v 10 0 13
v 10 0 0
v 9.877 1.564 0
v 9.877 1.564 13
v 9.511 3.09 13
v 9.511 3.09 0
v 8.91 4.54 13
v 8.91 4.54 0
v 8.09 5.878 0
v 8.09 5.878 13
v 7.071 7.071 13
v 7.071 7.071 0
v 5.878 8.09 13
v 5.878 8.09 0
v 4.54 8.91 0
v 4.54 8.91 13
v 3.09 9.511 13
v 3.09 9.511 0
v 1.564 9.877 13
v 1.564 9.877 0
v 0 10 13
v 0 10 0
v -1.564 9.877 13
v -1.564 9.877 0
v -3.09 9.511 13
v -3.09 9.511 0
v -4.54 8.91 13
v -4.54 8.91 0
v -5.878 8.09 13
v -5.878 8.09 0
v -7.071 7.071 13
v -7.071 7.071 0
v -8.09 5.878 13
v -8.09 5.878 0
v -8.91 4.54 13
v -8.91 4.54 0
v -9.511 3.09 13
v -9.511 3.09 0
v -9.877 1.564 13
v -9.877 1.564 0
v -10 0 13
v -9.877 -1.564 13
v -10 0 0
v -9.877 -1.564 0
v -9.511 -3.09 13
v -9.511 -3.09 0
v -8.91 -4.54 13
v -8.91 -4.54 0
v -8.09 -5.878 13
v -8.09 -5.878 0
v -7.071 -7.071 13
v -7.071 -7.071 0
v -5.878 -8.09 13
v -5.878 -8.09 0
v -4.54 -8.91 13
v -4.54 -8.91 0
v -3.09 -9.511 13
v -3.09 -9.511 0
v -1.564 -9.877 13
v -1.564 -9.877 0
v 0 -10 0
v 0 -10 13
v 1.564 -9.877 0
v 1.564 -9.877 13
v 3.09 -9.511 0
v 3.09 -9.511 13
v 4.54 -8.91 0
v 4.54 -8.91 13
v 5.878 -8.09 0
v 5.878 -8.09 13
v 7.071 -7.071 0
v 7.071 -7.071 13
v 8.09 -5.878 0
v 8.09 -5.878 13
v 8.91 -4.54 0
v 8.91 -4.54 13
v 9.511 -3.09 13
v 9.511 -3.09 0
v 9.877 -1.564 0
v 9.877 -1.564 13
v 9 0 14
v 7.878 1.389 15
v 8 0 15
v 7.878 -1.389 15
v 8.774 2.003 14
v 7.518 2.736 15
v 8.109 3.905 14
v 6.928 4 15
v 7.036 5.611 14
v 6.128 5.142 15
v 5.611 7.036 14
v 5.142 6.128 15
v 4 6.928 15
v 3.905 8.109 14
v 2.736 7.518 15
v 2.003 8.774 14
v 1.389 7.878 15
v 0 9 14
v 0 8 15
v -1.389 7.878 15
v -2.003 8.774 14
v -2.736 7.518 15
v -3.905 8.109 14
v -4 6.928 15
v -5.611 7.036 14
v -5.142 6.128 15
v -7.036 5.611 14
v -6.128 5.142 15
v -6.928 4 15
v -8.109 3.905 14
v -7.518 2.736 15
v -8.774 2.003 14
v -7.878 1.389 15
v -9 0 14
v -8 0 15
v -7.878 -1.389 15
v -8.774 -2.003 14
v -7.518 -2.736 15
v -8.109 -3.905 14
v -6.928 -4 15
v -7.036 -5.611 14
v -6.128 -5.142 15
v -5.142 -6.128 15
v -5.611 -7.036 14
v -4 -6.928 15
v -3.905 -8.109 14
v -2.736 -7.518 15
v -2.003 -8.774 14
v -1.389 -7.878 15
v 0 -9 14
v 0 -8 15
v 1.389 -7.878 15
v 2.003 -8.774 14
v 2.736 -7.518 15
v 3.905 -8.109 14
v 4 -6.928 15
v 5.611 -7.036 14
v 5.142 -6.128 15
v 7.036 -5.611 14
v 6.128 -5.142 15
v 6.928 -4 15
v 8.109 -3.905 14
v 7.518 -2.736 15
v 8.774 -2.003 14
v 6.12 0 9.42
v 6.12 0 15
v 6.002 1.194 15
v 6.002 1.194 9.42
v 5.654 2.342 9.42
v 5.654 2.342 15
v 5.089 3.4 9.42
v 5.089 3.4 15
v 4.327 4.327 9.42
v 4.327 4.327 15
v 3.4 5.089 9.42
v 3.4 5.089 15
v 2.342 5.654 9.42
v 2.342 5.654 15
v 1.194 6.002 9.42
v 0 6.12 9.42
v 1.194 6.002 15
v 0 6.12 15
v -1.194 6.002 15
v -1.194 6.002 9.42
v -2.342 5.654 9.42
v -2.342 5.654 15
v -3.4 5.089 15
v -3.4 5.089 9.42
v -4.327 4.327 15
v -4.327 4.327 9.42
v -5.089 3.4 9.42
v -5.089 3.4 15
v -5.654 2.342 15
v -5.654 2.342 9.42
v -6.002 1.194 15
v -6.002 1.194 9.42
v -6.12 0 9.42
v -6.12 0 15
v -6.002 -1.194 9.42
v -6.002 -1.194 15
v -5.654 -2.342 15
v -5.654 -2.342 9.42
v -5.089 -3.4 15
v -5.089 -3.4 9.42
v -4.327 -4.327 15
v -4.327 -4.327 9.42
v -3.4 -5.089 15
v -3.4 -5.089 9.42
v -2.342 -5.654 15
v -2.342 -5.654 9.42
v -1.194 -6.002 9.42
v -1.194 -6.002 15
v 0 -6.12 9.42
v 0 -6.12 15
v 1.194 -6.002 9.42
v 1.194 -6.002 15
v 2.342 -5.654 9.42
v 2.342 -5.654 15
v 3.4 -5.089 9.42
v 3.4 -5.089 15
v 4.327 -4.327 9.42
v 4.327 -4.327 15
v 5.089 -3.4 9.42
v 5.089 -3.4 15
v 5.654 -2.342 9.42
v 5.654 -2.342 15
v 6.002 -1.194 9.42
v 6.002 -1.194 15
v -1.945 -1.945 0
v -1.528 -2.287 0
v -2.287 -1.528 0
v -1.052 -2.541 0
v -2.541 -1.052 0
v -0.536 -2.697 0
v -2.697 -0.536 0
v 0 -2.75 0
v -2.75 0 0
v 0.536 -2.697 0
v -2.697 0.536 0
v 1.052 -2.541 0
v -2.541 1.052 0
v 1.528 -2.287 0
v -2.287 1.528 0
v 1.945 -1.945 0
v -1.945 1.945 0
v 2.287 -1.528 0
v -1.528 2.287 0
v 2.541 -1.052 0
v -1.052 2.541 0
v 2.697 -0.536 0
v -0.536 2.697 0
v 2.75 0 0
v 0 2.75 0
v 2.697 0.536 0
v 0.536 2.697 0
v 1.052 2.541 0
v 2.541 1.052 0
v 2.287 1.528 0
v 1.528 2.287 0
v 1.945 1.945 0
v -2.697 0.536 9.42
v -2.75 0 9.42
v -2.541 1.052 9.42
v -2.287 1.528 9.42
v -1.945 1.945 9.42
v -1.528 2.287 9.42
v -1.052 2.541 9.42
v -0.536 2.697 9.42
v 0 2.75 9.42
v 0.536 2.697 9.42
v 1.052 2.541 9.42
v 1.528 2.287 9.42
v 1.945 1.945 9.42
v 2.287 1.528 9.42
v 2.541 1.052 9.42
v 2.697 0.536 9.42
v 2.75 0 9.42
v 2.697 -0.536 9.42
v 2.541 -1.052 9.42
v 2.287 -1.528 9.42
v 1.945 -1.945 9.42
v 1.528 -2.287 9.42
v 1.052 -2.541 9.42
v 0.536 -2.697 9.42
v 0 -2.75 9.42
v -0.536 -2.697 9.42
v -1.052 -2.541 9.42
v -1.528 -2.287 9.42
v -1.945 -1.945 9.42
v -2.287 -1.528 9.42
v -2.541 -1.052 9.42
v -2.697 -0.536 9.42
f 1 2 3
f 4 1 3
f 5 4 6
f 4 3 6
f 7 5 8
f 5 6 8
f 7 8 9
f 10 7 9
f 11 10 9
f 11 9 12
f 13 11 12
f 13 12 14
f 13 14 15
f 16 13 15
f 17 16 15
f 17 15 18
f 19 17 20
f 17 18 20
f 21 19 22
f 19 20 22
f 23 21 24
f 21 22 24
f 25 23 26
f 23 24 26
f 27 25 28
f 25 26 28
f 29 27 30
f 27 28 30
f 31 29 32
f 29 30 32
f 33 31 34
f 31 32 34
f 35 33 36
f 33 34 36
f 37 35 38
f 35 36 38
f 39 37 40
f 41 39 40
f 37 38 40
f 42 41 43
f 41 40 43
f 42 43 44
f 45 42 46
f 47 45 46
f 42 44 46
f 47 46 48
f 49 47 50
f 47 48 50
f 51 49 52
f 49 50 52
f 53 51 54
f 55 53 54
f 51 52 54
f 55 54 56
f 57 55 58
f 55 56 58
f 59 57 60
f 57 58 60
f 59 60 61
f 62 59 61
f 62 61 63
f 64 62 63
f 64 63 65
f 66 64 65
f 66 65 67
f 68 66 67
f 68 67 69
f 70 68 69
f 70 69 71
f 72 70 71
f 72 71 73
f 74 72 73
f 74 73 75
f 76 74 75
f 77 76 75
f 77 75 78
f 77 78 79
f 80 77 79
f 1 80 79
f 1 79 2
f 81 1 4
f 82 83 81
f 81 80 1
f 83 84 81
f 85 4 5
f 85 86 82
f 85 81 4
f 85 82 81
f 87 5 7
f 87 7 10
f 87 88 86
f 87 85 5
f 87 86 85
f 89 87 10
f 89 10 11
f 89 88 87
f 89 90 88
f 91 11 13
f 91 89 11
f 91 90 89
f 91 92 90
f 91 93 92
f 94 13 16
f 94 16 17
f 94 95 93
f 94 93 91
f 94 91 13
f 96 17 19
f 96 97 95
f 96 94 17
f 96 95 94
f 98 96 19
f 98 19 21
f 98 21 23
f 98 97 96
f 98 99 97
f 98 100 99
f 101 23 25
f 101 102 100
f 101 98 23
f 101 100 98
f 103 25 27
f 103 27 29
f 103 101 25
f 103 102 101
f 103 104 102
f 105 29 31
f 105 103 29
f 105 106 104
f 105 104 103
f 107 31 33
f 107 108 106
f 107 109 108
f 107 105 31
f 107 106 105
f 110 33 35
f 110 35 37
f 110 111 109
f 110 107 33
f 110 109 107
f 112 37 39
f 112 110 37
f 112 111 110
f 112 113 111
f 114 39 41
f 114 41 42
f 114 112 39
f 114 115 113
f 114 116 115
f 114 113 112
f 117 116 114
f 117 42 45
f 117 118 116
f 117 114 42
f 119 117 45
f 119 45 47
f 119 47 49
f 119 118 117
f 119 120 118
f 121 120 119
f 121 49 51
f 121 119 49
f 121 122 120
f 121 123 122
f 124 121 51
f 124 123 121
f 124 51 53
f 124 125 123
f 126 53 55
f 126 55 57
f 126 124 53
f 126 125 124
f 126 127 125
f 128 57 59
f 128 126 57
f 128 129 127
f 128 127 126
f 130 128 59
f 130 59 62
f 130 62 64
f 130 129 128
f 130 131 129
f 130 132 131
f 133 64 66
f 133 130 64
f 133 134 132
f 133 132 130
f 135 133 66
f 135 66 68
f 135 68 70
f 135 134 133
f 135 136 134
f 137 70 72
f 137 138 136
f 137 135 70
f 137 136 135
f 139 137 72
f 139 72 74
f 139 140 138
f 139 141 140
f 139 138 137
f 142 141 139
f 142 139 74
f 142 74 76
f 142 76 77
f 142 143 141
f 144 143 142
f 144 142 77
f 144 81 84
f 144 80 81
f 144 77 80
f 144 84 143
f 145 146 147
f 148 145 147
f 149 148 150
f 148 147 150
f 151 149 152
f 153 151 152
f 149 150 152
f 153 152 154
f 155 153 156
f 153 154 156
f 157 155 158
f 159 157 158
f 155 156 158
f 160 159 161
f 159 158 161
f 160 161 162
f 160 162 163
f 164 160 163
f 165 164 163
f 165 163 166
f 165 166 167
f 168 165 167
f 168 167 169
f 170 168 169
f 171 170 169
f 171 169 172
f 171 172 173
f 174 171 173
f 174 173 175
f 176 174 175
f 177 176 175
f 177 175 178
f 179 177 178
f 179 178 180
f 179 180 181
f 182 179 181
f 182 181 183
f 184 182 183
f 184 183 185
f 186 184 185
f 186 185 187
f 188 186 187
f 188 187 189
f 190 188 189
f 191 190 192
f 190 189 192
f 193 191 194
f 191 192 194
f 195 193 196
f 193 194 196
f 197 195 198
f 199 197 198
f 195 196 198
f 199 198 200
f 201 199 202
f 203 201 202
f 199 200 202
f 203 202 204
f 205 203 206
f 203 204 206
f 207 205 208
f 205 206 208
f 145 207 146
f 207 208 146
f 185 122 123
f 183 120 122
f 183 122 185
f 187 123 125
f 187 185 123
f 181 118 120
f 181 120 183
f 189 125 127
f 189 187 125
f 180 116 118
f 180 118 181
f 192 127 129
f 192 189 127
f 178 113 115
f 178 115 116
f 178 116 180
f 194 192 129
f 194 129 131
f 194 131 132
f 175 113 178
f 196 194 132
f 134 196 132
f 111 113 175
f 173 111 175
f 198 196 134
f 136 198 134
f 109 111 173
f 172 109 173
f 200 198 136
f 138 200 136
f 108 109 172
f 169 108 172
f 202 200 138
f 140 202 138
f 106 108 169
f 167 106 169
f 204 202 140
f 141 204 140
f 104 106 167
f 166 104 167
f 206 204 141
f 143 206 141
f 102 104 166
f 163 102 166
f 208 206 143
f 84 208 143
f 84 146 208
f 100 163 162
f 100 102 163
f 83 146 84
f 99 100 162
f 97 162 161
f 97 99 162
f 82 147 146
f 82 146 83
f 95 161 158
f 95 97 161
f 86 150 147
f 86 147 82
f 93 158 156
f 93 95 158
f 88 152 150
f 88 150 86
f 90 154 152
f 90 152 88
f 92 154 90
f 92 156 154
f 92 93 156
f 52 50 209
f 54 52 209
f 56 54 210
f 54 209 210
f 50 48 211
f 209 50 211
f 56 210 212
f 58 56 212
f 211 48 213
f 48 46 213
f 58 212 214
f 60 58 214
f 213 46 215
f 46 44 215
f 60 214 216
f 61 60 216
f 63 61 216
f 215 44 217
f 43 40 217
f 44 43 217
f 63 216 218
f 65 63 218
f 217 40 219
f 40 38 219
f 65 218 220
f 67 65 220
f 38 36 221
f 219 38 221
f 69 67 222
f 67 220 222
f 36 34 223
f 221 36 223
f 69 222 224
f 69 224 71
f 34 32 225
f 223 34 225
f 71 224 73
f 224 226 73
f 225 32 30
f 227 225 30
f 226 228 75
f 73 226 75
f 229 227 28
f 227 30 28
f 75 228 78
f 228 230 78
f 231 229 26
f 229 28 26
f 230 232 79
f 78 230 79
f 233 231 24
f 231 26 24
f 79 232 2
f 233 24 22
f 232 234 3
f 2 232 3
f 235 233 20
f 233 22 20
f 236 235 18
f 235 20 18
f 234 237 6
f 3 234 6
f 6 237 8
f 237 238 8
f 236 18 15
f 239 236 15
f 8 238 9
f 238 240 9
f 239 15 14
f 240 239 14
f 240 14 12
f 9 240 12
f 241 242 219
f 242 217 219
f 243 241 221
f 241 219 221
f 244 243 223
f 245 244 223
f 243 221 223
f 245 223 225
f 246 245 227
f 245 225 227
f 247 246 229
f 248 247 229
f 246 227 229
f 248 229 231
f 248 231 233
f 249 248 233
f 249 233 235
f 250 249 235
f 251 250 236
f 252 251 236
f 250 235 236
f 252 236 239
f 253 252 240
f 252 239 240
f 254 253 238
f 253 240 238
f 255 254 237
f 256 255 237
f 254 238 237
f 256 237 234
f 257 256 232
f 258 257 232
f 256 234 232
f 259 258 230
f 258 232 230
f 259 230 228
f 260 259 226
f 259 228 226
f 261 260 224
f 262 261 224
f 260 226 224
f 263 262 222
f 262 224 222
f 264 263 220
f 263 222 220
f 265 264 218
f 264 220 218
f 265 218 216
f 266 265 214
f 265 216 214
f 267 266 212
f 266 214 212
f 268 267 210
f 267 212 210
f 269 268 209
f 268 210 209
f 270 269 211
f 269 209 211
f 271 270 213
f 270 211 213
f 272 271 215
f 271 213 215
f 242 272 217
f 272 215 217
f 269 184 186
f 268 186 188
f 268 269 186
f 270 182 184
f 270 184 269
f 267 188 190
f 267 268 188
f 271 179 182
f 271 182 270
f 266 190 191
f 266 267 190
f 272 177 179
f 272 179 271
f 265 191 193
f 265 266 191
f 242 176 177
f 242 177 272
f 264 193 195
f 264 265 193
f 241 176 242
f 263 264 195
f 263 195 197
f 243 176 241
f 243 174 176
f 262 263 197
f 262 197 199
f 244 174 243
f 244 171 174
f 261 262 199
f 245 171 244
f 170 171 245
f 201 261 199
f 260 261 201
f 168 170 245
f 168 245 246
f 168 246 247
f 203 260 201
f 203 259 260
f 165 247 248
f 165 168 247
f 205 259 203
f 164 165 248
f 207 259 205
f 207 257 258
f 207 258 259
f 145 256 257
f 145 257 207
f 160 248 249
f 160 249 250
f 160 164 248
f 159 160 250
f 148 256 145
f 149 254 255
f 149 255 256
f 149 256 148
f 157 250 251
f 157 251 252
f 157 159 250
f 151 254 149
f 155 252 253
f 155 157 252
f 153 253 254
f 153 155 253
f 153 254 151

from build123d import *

# Parameters (mm, degrees)
SKETCH1_R                               = 10
BOSS_EXTRUDE1_DEPTH                     = 15
CHAMFER1_SIZE                           = 2
CBORE_FOR_M5_HEX_HEAD_BOLT1_D           = 5.5
CBORE_FOR_M5_HEX_HEAD_BOLT1_CBORE_D     = 12.24
CBORE_FOR_M5_HEX_HEAD_BOLT1_CBORE_DEPTH = 5.58


with BuildPart() as part:
    # Sketch1 → Boss-Extrude1 (new body)
    with BuildSketch(Plane.XY):
        Circle(SKETCH1_R)
    extrude(amount=BOSS_EXTRUDE1_DEPTH)

    # Chamfer1
    chamfer1_edges = [part.edges().sort_by_distance(p)[0] for p in [
        (-10, 0, 15),
    ]]
    chamfer(chamfer1_edges, length=CHAMFER1_SIZE)

    # CBORE for M5 Hex Head Bolt1 (through all)
    with Locations(Plane.XY.offset(15)):
        with Locations((0, 0)):
            CounterBoreHole(CBORE_FOR_M5_HEX_HEAD_BOLT1_D / 2, CBORE_FOR_M5_HEX_HEAD_BOLT1_CBORE_D / 2, CBORE_FOR_M5_HEX_HEAD_BOLT1_CBORE_DEPTH)


solid = part.part
